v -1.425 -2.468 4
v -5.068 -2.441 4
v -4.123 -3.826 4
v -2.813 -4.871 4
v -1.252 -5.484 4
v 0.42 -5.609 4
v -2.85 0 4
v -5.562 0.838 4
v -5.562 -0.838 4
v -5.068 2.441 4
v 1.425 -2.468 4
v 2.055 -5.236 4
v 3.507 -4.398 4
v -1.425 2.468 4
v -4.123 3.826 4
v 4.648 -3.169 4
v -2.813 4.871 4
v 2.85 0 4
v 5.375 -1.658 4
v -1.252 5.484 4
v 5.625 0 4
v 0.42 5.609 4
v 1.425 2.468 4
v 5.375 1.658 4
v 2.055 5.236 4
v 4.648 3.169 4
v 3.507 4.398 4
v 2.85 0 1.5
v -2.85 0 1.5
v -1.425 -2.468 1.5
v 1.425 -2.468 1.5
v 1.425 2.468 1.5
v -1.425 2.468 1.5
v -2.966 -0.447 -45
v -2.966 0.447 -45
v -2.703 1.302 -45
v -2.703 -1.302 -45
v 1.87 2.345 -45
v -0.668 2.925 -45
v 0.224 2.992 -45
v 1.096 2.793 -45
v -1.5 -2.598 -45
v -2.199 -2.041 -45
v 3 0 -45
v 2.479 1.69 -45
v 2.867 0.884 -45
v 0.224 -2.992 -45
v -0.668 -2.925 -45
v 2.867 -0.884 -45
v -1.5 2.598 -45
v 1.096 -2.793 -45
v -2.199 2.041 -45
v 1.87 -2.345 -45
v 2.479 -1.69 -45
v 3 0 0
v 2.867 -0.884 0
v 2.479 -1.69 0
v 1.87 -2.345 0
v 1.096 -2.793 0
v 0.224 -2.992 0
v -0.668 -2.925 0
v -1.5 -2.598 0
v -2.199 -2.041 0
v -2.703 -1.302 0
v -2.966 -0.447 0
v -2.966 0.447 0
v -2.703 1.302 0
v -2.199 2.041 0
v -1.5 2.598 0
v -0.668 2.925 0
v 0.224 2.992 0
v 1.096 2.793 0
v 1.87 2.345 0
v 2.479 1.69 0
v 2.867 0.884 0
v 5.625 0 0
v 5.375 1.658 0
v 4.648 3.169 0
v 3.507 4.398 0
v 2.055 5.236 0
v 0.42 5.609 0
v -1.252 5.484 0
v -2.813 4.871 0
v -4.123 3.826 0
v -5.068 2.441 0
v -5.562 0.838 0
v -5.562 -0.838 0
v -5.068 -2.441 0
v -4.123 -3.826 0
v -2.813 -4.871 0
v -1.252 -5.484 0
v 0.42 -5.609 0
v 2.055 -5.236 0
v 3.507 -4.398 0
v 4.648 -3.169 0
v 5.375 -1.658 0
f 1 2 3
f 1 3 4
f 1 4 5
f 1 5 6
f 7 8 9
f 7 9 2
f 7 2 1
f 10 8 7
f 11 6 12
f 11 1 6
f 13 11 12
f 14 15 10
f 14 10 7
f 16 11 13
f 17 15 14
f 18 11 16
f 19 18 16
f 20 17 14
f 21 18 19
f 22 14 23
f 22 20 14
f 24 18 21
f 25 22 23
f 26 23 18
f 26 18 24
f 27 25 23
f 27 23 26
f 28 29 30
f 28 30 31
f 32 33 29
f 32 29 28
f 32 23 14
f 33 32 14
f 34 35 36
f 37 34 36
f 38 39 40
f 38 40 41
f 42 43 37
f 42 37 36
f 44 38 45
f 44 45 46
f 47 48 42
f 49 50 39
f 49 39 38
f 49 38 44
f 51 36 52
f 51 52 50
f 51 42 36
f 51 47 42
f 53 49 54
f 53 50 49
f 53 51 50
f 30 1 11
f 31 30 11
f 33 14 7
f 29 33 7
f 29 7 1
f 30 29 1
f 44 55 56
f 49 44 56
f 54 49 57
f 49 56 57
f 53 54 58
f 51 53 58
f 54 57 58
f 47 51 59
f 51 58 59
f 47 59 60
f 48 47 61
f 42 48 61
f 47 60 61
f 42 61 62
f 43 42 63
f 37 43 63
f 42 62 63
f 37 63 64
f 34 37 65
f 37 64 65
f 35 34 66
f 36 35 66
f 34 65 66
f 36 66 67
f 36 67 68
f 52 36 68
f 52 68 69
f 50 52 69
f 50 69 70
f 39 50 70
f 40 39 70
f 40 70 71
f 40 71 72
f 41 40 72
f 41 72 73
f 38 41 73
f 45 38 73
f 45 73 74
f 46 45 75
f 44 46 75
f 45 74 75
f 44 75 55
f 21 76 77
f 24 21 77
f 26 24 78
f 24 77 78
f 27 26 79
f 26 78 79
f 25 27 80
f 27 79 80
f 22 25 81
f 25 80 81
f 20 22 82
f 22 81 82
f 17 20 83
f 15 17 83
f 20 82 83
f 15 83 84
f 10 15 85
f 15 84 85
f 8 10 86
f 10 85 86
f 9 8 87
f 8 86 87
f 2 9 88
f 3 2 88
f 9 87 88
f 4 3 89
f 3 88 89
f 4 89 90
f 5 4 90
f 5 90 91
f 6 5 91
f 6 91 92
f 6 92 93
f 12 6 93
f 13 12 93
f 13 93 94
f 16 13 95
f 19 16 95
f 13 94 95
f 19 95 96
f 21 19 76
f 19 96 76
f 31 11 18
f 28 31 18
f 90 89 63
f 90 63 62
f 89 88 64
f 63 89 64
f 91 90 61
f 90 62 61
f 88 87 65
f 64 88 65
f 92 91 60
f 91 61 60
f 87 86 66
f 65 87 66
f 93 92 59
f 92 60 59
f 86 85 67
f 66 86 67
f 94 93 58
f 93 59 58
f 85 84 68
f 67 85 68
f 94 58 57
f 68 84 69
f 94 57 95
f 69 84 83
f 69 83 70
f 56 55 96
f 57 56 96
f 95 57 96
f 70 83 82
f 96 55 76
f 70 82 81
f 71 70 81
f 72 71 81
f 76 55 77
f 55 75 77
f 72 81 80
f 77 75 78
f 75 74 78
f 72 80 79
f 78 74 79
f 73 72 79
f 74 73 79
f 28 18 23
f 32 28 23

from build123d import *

# Parameters (mm, degrees)
ESBO_O1_R                = 5.625
RESSALTO_EXTRUS_O1_DEPTH = 4
CORTE_EXTRUS_O1_DEPTH    = 2.5
ESBO_O3_R                = 3
RESSALTO_EXTRUS_O2_DEPTH = 45


with BuildPart() as part:
    # Esboço1 → Ressalto-extrusão1 (new body)
    with BuildSketch(Plane.XY):
        Circle(ESBO_O1_R)
    extrude(amount=RESSALTO_EXTRUS_O1_DEPTH)

    # Esboço2 → Corte-extrusão1 (cut)
    with BuildSketch(Plane.XY.offset(4)):
        Polygon((2.85, 0), (1.425, 2.468172401), (-1.425, 2.468172401), (-2.85, 0), (-1.425, -2.468172401), (1.425, -2.468172401), align=None)
    extrude(amount=-CORTE_EXTRUS_O1_DEPTH, mode=Mode.SUBTRACT)

    # Esboço3 → Ressalto-extrusão2 (add)
    with BuildSketch(Plane(origin=(0, 0, 0), x_dir=(-1, 0, 0), z_dir=(0, 0, -1))):
        with Locations(Location((0, 0, 0), (0, 0, 180))):
            Circle(ESBO_O3_R)
    extrude(amount=RESSALTO_EXTRUS_O2_DEPTH)


solid = part.part
